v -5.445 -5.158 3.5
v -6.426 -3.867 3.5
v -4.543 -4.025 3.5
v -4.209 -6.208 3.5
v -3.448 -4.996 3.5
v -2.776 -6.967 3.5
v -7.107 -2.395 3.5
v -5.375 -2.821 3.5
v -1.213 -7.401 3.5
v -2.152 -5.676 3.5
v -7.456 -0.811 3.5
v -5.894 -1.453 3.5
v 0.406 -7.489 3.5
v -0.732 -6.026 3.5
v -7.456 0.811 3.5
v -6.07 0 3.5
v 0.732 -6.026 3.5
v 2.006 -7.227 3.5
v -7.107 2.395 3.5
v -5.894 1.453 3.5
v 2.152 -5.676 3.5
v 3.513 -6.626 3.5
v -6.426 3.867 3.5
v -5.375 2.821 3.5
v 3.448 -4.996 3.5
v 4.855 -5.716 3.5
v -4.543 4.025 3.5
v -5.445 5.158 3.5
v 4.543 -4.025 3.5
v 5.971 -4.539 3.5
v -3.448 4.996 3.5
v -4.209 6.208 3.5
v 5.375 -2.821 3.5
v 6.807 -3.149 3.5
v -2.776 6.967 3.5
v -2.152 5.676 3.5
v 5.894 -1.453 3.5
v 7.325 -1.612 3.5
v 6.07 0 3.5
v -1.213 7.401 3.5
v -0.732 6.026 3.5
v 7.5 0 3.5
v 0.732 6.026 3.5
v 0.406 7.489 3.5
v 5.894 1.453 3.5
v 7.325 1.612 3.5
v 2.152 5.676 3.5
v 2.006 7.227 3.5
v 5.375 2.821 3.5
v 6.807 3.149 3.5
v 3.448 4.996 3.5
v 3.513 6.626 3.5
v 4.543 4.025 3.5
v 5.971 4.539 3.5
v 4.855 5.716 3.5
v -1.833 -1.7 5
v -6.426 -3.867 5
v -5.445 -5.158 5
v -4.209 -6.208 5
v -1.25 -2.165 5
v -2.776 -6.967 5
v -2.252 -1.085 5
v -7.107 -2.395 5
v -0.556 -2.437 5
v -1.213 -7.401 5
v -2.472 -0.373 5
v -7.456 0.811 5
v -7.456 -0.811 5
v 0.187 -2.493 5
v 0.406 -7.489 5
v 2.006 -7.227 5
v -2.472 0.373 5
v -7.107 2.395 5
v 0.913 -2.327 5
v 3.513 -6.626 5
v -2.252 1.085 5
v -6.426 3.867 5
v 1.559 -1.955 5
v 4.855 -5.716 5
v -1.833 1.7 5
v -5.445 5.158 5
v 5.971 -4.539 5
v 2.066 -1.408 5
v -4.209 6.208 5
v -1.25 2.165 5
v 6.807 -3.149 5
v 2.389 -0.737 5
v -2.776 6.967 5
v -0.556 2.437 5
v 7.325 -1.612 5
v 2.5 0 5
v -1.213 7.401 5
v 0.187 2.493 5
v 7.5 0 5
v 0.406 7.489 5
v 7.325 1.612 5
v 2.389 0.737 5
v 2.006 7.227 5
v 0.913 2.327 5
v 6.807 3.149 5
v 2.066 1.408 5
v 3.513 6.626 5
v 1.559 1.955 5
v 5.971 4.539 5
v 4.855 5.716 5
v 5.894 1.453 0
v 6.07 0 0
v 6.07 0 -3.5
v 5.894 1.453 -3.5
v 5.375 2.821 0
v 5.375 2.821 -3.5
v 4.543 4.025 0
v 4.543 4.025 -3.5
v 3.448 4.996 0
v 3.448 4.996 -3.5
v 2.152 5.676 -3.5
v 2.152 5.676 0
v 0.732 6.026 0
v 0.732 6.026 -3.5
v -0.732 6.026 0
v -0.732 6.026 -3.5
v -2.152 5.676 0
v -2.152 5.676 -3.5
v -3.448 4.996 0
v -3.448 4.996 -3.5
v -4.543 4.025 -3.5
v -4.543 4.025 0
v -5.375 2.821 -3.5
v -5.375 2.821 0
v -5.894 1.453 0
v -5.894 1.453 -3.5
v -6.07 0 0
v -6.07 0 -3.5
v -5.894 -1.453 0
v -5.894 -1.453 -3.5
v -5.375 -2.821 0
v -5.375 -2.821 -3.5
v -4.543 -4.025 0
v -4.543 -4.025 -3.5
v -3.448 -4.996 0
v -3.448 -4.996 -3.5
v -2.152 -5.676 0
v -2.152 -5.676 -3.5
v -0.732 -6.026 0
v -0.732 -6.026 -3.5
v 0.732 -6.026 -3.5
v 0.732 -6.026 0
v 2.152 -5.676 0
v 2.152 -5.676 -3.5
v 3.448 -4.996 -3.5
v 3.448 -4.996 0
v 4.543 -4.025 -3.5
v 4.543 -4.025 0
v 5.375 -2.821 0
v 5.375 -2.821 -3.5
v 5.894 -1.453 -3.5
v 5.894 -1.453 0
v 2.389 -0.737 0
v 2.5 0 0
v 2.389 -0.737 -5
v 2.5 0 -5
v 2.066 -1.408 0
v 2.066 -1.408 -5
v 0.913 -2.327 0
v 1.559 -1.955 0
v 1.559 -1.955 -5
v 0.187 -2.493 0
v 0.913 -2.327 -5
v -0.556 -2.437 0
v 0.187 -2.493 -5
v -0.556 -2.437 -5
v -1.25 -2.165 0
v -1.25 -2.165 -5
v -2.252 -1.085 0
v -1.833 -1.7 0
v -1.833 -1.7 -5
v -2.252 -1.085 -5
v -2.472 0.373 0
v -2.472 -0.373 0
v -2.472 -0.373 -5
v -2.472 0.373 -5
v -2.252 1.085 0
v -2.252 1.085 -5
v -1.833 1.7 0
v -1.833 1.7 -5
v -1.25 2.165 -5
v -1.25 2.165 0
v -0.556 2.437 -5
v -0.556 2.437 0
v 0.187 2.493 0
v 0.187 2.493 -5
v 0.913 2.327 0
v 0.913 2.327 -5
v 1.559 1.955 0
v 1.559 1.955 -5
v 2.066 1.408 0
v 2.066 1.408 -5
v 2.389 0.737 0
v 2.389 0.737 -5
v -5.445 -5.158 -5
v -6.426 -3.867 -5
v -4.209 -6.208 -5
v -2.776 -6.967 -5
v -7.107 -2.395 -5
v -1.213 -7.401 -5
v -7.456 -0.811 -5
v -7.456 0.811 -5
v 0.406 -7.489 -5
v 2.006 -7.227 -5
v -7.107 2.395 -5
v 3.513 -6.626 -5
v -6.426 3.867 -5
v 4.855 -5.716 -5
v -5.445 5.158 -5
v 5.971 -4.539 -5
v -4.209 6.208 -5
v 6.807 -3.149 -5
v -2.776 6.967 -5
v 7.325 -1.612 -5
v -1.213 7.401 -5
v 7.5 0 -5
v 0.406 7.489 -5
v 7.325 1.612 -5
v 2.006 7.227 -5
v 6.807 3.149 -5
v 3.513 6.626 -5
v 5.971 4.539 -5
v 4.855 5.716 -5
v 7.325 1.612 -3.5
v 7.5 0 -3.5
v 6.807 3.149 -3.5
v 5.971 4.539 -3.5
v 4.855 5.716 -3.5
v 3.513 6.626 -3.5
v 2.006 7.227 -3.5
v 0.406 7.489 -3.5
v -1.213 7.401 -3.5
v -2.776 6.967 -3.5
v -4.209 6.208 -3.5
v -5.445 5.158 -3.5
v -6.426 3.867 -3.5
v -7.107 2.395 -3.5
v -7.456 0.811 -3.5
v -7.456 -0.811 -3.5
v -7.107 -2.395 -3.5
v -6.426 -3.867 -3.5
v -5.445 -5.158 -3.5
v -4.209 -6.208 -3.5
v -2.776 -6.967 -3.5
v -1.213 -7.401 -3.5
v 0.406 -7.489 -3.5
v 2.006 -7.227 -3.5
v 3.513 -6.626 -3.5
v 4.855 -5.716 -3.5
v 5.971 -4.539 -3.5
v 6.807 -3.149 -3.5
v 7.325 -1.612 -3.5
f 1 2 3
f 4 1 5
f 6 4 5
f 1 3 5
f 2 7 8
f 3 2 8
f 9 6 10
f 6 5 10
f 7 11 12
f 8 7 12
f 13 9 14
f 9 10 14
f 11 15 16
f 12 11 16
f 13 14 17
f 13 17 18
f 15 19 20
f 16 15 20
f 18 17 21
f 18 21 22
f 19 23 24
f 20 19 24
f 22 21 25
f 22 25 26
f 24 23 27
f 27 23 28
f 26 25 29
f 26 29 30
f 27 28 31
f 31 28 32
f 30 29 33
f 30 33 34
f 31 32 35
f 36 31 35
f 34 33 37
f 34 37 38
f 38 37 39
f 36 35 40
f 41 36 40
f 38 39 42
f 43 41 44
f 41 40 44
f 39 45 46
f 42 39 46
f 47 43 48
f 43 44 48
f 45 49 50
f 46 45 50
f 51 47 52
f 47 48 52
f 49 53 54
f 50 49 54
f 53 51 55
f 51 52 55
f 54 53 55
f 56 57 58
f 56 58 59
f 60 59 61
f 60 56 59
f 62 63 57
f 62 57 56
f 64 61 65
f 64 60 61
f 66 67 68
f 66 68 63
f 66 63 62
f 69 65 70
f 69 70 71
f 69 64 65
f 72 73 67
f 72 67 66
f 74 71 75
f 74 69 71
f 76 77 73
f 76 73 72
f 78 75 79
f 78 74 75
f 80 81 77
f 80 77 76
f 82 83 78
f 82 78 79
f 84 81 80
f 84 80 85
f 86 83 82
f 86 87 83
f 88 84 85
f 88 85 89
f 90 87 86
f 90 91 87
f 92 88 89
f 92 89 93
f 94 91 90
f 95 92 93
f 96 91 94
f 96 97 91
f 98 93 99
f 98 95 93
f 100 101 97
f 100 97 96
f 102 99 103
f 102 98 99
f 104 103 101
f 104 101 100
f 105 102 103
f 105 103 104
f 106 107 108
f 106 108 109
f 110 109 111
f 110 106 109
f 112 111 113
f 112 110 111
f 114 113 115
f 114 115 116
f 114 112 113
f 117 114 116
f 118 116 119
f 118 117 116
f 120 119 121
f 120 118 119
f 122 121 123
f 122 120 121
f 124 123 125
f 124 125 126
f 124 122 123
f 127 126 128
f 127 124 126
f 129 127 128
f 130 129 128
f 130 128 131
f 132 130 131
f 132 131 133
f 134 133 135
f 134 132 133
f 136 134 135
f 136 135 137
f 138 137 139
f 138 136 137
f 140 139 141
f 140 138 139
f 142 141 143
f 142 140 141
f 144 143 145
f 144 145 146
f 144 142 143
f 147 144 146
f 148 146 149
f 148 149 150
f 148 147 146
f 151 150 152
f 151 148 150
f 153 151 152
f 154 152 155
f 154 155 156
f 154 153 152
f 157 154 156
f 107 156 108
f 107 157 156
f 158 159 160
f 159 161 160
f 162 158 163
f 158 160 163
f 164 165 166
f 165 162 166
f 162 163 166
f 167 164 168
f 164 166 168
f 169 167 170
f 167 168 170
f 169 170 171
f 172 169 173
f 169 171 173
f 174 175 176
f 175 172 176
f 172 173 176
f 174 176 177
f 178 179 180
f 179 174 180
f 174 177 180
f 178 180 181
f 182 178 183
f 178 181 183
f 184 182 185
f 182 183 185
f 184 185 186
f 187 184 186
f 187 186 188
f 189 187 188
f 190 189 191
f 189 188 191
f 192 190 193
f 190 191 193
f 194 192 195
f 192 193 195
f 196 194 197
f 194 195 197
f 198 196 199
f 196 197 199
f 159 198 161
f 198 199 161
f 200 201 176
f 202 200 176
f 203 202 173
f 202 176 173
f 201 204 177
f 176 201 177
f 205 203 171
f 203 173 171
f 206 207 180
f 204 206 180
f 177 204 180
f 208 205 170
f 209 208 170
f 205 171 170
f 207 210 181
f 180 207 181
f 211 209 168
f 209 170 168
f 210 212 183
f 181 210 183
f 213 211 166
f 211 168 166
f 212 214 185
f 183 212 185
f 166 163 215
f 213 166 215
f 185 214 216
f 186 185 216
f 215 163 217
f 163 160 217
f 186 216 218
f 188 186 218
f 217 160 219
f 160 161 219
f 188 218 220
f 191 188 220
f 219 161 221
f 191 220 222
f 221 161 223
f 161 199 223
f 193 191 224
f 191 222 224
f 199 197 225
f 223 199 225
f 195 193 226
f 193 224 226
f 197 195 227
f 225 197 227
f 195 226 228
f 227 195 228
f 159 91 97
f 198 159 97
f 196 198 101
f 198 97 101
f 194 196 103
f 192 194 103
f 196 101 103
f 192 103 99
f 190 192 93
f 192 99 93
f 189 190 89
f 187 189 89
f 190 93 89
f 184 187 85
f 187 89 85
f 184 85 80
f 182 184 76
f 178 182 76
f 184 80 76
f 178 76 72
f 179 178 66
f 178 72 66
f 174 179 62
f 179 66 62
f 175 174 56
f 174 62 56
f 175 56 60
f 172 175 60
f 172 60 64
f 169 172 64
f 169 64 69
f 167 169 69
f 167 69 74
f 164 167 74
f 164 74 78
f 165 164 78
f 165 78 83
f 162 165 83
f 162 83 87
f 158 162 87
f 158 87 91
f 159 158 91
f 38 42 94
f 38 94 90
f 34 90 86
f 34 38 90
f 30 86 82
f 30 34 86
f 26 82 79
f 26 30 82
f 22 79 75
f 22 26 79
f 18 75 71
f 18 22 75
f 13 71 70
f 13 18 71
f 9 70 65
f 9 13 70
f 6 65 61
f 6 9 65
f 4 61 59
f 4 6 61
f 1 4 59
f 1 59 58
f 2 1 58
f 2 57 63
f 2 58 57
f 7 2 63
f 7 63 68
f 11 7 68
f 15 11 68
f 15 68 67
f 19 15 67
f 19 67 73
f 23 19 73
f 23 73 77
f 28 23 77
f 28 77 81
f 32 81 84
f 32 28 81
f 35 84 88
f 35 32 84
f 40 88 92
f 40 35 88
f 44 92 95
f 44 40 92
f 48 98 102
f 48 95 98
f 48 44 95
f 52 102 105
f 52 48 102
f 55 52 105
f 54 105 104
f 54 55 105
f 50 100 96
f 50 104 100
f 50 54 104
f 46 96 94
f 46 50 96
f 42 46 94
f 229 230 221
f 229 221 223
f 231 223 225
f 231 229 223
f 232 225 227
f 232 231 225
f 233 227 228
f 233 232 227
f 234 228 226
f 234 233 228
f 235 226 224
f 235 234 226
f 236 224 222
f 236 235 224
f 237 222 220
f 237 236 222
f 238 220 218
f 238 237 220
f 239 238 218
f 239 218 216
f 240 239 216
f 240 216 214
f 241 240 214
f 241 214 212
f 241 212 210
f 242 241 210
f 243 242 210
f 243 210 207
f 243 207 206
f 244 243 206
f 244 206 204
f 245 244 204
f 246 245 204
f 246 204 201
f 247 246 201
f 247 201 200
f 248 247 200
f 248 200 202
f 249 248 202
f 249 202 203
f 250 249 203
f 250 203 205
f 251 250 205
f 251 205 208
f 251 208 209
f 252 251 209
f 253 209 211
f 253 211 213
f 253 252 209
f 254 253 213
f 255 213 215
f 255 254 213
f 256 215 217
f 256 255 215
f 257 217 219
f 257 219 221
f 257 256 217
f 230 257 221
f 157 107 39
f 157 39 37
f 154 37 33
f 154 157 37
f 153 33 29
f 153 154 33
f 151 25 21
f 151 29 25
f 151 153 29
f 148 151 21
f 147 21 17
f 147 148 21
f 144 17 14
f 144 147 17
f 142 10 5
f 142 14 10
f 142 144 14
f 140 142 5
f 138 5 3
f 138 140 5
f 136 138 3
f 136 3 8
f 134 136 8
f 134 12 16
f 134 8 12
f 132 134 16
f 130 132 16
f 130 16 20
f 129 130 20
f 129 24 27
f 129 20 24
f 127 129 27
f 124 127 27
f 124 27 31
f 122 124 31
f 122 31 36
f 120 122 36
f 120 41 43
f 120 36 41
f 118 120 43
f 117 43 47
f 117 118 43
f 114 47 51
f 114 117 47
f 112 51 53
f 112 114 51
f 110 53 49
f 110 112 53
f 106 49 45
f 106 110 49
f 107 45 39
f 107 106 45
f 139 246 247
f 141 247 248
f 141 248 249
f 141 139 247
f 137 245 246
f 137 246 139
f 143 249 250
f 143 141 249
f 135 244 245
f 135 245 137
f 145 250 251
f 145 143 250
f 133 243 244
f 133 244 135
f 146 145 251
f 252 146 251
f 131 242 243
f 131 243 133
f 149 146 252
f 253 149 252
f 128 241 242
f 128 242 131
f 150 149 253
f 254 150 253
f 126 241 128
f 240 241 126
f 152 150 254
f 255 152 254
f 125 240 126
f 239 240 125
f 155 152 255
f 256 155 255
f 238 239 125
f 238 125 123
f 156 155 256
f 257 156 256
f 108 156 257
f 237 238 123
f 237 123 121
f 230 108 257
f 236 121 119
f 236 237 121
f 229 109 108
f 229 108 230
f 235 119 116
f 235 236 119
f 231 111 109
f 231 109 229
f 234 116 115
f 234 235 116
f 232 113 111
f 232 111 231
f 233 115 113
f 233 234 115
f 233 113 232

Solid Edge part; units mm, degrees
sketch "Sketch1" plane through (0, 0, 0) normal (0, -1, 0) x (1, 0, 0)
  line L0 (2.5, 0) -> (2.5, 5)
  line L1 (2.5, 5) -> (7.5, 5)
  line L2 (7.5, 5) -> (7.5, 3.5)
  line L3 (7.5, 3.5) -> (6.07, 3.5)
  line L4 (6.07, 3.5) -> (6.07, 0)
  line L5 (6.07, -3.5) -> (6.07, 0)
  line L6 (7.5, -3.5) -> (6.07, -3.5)
  line L7 (7.5, -5) -> (7.5, -3.5)
  line L8 (2.5, -5) -> (7.5, -5)
  line L9 (2.5, 0) -> (2.5, -5)
  dimension "D1" = 2.5
  dimension "D2" = 7.5
  dimension "D3" = 5
  dimension "D4" = 3.5
  dimension "D5" = 6.07
revolve "RevolvedProtrusion1" add sketch "Sketch1" angle 360 about axis through (0, 0, 0) along (0, 0, 1)
properties material "Aluminum, 6061-T6"
